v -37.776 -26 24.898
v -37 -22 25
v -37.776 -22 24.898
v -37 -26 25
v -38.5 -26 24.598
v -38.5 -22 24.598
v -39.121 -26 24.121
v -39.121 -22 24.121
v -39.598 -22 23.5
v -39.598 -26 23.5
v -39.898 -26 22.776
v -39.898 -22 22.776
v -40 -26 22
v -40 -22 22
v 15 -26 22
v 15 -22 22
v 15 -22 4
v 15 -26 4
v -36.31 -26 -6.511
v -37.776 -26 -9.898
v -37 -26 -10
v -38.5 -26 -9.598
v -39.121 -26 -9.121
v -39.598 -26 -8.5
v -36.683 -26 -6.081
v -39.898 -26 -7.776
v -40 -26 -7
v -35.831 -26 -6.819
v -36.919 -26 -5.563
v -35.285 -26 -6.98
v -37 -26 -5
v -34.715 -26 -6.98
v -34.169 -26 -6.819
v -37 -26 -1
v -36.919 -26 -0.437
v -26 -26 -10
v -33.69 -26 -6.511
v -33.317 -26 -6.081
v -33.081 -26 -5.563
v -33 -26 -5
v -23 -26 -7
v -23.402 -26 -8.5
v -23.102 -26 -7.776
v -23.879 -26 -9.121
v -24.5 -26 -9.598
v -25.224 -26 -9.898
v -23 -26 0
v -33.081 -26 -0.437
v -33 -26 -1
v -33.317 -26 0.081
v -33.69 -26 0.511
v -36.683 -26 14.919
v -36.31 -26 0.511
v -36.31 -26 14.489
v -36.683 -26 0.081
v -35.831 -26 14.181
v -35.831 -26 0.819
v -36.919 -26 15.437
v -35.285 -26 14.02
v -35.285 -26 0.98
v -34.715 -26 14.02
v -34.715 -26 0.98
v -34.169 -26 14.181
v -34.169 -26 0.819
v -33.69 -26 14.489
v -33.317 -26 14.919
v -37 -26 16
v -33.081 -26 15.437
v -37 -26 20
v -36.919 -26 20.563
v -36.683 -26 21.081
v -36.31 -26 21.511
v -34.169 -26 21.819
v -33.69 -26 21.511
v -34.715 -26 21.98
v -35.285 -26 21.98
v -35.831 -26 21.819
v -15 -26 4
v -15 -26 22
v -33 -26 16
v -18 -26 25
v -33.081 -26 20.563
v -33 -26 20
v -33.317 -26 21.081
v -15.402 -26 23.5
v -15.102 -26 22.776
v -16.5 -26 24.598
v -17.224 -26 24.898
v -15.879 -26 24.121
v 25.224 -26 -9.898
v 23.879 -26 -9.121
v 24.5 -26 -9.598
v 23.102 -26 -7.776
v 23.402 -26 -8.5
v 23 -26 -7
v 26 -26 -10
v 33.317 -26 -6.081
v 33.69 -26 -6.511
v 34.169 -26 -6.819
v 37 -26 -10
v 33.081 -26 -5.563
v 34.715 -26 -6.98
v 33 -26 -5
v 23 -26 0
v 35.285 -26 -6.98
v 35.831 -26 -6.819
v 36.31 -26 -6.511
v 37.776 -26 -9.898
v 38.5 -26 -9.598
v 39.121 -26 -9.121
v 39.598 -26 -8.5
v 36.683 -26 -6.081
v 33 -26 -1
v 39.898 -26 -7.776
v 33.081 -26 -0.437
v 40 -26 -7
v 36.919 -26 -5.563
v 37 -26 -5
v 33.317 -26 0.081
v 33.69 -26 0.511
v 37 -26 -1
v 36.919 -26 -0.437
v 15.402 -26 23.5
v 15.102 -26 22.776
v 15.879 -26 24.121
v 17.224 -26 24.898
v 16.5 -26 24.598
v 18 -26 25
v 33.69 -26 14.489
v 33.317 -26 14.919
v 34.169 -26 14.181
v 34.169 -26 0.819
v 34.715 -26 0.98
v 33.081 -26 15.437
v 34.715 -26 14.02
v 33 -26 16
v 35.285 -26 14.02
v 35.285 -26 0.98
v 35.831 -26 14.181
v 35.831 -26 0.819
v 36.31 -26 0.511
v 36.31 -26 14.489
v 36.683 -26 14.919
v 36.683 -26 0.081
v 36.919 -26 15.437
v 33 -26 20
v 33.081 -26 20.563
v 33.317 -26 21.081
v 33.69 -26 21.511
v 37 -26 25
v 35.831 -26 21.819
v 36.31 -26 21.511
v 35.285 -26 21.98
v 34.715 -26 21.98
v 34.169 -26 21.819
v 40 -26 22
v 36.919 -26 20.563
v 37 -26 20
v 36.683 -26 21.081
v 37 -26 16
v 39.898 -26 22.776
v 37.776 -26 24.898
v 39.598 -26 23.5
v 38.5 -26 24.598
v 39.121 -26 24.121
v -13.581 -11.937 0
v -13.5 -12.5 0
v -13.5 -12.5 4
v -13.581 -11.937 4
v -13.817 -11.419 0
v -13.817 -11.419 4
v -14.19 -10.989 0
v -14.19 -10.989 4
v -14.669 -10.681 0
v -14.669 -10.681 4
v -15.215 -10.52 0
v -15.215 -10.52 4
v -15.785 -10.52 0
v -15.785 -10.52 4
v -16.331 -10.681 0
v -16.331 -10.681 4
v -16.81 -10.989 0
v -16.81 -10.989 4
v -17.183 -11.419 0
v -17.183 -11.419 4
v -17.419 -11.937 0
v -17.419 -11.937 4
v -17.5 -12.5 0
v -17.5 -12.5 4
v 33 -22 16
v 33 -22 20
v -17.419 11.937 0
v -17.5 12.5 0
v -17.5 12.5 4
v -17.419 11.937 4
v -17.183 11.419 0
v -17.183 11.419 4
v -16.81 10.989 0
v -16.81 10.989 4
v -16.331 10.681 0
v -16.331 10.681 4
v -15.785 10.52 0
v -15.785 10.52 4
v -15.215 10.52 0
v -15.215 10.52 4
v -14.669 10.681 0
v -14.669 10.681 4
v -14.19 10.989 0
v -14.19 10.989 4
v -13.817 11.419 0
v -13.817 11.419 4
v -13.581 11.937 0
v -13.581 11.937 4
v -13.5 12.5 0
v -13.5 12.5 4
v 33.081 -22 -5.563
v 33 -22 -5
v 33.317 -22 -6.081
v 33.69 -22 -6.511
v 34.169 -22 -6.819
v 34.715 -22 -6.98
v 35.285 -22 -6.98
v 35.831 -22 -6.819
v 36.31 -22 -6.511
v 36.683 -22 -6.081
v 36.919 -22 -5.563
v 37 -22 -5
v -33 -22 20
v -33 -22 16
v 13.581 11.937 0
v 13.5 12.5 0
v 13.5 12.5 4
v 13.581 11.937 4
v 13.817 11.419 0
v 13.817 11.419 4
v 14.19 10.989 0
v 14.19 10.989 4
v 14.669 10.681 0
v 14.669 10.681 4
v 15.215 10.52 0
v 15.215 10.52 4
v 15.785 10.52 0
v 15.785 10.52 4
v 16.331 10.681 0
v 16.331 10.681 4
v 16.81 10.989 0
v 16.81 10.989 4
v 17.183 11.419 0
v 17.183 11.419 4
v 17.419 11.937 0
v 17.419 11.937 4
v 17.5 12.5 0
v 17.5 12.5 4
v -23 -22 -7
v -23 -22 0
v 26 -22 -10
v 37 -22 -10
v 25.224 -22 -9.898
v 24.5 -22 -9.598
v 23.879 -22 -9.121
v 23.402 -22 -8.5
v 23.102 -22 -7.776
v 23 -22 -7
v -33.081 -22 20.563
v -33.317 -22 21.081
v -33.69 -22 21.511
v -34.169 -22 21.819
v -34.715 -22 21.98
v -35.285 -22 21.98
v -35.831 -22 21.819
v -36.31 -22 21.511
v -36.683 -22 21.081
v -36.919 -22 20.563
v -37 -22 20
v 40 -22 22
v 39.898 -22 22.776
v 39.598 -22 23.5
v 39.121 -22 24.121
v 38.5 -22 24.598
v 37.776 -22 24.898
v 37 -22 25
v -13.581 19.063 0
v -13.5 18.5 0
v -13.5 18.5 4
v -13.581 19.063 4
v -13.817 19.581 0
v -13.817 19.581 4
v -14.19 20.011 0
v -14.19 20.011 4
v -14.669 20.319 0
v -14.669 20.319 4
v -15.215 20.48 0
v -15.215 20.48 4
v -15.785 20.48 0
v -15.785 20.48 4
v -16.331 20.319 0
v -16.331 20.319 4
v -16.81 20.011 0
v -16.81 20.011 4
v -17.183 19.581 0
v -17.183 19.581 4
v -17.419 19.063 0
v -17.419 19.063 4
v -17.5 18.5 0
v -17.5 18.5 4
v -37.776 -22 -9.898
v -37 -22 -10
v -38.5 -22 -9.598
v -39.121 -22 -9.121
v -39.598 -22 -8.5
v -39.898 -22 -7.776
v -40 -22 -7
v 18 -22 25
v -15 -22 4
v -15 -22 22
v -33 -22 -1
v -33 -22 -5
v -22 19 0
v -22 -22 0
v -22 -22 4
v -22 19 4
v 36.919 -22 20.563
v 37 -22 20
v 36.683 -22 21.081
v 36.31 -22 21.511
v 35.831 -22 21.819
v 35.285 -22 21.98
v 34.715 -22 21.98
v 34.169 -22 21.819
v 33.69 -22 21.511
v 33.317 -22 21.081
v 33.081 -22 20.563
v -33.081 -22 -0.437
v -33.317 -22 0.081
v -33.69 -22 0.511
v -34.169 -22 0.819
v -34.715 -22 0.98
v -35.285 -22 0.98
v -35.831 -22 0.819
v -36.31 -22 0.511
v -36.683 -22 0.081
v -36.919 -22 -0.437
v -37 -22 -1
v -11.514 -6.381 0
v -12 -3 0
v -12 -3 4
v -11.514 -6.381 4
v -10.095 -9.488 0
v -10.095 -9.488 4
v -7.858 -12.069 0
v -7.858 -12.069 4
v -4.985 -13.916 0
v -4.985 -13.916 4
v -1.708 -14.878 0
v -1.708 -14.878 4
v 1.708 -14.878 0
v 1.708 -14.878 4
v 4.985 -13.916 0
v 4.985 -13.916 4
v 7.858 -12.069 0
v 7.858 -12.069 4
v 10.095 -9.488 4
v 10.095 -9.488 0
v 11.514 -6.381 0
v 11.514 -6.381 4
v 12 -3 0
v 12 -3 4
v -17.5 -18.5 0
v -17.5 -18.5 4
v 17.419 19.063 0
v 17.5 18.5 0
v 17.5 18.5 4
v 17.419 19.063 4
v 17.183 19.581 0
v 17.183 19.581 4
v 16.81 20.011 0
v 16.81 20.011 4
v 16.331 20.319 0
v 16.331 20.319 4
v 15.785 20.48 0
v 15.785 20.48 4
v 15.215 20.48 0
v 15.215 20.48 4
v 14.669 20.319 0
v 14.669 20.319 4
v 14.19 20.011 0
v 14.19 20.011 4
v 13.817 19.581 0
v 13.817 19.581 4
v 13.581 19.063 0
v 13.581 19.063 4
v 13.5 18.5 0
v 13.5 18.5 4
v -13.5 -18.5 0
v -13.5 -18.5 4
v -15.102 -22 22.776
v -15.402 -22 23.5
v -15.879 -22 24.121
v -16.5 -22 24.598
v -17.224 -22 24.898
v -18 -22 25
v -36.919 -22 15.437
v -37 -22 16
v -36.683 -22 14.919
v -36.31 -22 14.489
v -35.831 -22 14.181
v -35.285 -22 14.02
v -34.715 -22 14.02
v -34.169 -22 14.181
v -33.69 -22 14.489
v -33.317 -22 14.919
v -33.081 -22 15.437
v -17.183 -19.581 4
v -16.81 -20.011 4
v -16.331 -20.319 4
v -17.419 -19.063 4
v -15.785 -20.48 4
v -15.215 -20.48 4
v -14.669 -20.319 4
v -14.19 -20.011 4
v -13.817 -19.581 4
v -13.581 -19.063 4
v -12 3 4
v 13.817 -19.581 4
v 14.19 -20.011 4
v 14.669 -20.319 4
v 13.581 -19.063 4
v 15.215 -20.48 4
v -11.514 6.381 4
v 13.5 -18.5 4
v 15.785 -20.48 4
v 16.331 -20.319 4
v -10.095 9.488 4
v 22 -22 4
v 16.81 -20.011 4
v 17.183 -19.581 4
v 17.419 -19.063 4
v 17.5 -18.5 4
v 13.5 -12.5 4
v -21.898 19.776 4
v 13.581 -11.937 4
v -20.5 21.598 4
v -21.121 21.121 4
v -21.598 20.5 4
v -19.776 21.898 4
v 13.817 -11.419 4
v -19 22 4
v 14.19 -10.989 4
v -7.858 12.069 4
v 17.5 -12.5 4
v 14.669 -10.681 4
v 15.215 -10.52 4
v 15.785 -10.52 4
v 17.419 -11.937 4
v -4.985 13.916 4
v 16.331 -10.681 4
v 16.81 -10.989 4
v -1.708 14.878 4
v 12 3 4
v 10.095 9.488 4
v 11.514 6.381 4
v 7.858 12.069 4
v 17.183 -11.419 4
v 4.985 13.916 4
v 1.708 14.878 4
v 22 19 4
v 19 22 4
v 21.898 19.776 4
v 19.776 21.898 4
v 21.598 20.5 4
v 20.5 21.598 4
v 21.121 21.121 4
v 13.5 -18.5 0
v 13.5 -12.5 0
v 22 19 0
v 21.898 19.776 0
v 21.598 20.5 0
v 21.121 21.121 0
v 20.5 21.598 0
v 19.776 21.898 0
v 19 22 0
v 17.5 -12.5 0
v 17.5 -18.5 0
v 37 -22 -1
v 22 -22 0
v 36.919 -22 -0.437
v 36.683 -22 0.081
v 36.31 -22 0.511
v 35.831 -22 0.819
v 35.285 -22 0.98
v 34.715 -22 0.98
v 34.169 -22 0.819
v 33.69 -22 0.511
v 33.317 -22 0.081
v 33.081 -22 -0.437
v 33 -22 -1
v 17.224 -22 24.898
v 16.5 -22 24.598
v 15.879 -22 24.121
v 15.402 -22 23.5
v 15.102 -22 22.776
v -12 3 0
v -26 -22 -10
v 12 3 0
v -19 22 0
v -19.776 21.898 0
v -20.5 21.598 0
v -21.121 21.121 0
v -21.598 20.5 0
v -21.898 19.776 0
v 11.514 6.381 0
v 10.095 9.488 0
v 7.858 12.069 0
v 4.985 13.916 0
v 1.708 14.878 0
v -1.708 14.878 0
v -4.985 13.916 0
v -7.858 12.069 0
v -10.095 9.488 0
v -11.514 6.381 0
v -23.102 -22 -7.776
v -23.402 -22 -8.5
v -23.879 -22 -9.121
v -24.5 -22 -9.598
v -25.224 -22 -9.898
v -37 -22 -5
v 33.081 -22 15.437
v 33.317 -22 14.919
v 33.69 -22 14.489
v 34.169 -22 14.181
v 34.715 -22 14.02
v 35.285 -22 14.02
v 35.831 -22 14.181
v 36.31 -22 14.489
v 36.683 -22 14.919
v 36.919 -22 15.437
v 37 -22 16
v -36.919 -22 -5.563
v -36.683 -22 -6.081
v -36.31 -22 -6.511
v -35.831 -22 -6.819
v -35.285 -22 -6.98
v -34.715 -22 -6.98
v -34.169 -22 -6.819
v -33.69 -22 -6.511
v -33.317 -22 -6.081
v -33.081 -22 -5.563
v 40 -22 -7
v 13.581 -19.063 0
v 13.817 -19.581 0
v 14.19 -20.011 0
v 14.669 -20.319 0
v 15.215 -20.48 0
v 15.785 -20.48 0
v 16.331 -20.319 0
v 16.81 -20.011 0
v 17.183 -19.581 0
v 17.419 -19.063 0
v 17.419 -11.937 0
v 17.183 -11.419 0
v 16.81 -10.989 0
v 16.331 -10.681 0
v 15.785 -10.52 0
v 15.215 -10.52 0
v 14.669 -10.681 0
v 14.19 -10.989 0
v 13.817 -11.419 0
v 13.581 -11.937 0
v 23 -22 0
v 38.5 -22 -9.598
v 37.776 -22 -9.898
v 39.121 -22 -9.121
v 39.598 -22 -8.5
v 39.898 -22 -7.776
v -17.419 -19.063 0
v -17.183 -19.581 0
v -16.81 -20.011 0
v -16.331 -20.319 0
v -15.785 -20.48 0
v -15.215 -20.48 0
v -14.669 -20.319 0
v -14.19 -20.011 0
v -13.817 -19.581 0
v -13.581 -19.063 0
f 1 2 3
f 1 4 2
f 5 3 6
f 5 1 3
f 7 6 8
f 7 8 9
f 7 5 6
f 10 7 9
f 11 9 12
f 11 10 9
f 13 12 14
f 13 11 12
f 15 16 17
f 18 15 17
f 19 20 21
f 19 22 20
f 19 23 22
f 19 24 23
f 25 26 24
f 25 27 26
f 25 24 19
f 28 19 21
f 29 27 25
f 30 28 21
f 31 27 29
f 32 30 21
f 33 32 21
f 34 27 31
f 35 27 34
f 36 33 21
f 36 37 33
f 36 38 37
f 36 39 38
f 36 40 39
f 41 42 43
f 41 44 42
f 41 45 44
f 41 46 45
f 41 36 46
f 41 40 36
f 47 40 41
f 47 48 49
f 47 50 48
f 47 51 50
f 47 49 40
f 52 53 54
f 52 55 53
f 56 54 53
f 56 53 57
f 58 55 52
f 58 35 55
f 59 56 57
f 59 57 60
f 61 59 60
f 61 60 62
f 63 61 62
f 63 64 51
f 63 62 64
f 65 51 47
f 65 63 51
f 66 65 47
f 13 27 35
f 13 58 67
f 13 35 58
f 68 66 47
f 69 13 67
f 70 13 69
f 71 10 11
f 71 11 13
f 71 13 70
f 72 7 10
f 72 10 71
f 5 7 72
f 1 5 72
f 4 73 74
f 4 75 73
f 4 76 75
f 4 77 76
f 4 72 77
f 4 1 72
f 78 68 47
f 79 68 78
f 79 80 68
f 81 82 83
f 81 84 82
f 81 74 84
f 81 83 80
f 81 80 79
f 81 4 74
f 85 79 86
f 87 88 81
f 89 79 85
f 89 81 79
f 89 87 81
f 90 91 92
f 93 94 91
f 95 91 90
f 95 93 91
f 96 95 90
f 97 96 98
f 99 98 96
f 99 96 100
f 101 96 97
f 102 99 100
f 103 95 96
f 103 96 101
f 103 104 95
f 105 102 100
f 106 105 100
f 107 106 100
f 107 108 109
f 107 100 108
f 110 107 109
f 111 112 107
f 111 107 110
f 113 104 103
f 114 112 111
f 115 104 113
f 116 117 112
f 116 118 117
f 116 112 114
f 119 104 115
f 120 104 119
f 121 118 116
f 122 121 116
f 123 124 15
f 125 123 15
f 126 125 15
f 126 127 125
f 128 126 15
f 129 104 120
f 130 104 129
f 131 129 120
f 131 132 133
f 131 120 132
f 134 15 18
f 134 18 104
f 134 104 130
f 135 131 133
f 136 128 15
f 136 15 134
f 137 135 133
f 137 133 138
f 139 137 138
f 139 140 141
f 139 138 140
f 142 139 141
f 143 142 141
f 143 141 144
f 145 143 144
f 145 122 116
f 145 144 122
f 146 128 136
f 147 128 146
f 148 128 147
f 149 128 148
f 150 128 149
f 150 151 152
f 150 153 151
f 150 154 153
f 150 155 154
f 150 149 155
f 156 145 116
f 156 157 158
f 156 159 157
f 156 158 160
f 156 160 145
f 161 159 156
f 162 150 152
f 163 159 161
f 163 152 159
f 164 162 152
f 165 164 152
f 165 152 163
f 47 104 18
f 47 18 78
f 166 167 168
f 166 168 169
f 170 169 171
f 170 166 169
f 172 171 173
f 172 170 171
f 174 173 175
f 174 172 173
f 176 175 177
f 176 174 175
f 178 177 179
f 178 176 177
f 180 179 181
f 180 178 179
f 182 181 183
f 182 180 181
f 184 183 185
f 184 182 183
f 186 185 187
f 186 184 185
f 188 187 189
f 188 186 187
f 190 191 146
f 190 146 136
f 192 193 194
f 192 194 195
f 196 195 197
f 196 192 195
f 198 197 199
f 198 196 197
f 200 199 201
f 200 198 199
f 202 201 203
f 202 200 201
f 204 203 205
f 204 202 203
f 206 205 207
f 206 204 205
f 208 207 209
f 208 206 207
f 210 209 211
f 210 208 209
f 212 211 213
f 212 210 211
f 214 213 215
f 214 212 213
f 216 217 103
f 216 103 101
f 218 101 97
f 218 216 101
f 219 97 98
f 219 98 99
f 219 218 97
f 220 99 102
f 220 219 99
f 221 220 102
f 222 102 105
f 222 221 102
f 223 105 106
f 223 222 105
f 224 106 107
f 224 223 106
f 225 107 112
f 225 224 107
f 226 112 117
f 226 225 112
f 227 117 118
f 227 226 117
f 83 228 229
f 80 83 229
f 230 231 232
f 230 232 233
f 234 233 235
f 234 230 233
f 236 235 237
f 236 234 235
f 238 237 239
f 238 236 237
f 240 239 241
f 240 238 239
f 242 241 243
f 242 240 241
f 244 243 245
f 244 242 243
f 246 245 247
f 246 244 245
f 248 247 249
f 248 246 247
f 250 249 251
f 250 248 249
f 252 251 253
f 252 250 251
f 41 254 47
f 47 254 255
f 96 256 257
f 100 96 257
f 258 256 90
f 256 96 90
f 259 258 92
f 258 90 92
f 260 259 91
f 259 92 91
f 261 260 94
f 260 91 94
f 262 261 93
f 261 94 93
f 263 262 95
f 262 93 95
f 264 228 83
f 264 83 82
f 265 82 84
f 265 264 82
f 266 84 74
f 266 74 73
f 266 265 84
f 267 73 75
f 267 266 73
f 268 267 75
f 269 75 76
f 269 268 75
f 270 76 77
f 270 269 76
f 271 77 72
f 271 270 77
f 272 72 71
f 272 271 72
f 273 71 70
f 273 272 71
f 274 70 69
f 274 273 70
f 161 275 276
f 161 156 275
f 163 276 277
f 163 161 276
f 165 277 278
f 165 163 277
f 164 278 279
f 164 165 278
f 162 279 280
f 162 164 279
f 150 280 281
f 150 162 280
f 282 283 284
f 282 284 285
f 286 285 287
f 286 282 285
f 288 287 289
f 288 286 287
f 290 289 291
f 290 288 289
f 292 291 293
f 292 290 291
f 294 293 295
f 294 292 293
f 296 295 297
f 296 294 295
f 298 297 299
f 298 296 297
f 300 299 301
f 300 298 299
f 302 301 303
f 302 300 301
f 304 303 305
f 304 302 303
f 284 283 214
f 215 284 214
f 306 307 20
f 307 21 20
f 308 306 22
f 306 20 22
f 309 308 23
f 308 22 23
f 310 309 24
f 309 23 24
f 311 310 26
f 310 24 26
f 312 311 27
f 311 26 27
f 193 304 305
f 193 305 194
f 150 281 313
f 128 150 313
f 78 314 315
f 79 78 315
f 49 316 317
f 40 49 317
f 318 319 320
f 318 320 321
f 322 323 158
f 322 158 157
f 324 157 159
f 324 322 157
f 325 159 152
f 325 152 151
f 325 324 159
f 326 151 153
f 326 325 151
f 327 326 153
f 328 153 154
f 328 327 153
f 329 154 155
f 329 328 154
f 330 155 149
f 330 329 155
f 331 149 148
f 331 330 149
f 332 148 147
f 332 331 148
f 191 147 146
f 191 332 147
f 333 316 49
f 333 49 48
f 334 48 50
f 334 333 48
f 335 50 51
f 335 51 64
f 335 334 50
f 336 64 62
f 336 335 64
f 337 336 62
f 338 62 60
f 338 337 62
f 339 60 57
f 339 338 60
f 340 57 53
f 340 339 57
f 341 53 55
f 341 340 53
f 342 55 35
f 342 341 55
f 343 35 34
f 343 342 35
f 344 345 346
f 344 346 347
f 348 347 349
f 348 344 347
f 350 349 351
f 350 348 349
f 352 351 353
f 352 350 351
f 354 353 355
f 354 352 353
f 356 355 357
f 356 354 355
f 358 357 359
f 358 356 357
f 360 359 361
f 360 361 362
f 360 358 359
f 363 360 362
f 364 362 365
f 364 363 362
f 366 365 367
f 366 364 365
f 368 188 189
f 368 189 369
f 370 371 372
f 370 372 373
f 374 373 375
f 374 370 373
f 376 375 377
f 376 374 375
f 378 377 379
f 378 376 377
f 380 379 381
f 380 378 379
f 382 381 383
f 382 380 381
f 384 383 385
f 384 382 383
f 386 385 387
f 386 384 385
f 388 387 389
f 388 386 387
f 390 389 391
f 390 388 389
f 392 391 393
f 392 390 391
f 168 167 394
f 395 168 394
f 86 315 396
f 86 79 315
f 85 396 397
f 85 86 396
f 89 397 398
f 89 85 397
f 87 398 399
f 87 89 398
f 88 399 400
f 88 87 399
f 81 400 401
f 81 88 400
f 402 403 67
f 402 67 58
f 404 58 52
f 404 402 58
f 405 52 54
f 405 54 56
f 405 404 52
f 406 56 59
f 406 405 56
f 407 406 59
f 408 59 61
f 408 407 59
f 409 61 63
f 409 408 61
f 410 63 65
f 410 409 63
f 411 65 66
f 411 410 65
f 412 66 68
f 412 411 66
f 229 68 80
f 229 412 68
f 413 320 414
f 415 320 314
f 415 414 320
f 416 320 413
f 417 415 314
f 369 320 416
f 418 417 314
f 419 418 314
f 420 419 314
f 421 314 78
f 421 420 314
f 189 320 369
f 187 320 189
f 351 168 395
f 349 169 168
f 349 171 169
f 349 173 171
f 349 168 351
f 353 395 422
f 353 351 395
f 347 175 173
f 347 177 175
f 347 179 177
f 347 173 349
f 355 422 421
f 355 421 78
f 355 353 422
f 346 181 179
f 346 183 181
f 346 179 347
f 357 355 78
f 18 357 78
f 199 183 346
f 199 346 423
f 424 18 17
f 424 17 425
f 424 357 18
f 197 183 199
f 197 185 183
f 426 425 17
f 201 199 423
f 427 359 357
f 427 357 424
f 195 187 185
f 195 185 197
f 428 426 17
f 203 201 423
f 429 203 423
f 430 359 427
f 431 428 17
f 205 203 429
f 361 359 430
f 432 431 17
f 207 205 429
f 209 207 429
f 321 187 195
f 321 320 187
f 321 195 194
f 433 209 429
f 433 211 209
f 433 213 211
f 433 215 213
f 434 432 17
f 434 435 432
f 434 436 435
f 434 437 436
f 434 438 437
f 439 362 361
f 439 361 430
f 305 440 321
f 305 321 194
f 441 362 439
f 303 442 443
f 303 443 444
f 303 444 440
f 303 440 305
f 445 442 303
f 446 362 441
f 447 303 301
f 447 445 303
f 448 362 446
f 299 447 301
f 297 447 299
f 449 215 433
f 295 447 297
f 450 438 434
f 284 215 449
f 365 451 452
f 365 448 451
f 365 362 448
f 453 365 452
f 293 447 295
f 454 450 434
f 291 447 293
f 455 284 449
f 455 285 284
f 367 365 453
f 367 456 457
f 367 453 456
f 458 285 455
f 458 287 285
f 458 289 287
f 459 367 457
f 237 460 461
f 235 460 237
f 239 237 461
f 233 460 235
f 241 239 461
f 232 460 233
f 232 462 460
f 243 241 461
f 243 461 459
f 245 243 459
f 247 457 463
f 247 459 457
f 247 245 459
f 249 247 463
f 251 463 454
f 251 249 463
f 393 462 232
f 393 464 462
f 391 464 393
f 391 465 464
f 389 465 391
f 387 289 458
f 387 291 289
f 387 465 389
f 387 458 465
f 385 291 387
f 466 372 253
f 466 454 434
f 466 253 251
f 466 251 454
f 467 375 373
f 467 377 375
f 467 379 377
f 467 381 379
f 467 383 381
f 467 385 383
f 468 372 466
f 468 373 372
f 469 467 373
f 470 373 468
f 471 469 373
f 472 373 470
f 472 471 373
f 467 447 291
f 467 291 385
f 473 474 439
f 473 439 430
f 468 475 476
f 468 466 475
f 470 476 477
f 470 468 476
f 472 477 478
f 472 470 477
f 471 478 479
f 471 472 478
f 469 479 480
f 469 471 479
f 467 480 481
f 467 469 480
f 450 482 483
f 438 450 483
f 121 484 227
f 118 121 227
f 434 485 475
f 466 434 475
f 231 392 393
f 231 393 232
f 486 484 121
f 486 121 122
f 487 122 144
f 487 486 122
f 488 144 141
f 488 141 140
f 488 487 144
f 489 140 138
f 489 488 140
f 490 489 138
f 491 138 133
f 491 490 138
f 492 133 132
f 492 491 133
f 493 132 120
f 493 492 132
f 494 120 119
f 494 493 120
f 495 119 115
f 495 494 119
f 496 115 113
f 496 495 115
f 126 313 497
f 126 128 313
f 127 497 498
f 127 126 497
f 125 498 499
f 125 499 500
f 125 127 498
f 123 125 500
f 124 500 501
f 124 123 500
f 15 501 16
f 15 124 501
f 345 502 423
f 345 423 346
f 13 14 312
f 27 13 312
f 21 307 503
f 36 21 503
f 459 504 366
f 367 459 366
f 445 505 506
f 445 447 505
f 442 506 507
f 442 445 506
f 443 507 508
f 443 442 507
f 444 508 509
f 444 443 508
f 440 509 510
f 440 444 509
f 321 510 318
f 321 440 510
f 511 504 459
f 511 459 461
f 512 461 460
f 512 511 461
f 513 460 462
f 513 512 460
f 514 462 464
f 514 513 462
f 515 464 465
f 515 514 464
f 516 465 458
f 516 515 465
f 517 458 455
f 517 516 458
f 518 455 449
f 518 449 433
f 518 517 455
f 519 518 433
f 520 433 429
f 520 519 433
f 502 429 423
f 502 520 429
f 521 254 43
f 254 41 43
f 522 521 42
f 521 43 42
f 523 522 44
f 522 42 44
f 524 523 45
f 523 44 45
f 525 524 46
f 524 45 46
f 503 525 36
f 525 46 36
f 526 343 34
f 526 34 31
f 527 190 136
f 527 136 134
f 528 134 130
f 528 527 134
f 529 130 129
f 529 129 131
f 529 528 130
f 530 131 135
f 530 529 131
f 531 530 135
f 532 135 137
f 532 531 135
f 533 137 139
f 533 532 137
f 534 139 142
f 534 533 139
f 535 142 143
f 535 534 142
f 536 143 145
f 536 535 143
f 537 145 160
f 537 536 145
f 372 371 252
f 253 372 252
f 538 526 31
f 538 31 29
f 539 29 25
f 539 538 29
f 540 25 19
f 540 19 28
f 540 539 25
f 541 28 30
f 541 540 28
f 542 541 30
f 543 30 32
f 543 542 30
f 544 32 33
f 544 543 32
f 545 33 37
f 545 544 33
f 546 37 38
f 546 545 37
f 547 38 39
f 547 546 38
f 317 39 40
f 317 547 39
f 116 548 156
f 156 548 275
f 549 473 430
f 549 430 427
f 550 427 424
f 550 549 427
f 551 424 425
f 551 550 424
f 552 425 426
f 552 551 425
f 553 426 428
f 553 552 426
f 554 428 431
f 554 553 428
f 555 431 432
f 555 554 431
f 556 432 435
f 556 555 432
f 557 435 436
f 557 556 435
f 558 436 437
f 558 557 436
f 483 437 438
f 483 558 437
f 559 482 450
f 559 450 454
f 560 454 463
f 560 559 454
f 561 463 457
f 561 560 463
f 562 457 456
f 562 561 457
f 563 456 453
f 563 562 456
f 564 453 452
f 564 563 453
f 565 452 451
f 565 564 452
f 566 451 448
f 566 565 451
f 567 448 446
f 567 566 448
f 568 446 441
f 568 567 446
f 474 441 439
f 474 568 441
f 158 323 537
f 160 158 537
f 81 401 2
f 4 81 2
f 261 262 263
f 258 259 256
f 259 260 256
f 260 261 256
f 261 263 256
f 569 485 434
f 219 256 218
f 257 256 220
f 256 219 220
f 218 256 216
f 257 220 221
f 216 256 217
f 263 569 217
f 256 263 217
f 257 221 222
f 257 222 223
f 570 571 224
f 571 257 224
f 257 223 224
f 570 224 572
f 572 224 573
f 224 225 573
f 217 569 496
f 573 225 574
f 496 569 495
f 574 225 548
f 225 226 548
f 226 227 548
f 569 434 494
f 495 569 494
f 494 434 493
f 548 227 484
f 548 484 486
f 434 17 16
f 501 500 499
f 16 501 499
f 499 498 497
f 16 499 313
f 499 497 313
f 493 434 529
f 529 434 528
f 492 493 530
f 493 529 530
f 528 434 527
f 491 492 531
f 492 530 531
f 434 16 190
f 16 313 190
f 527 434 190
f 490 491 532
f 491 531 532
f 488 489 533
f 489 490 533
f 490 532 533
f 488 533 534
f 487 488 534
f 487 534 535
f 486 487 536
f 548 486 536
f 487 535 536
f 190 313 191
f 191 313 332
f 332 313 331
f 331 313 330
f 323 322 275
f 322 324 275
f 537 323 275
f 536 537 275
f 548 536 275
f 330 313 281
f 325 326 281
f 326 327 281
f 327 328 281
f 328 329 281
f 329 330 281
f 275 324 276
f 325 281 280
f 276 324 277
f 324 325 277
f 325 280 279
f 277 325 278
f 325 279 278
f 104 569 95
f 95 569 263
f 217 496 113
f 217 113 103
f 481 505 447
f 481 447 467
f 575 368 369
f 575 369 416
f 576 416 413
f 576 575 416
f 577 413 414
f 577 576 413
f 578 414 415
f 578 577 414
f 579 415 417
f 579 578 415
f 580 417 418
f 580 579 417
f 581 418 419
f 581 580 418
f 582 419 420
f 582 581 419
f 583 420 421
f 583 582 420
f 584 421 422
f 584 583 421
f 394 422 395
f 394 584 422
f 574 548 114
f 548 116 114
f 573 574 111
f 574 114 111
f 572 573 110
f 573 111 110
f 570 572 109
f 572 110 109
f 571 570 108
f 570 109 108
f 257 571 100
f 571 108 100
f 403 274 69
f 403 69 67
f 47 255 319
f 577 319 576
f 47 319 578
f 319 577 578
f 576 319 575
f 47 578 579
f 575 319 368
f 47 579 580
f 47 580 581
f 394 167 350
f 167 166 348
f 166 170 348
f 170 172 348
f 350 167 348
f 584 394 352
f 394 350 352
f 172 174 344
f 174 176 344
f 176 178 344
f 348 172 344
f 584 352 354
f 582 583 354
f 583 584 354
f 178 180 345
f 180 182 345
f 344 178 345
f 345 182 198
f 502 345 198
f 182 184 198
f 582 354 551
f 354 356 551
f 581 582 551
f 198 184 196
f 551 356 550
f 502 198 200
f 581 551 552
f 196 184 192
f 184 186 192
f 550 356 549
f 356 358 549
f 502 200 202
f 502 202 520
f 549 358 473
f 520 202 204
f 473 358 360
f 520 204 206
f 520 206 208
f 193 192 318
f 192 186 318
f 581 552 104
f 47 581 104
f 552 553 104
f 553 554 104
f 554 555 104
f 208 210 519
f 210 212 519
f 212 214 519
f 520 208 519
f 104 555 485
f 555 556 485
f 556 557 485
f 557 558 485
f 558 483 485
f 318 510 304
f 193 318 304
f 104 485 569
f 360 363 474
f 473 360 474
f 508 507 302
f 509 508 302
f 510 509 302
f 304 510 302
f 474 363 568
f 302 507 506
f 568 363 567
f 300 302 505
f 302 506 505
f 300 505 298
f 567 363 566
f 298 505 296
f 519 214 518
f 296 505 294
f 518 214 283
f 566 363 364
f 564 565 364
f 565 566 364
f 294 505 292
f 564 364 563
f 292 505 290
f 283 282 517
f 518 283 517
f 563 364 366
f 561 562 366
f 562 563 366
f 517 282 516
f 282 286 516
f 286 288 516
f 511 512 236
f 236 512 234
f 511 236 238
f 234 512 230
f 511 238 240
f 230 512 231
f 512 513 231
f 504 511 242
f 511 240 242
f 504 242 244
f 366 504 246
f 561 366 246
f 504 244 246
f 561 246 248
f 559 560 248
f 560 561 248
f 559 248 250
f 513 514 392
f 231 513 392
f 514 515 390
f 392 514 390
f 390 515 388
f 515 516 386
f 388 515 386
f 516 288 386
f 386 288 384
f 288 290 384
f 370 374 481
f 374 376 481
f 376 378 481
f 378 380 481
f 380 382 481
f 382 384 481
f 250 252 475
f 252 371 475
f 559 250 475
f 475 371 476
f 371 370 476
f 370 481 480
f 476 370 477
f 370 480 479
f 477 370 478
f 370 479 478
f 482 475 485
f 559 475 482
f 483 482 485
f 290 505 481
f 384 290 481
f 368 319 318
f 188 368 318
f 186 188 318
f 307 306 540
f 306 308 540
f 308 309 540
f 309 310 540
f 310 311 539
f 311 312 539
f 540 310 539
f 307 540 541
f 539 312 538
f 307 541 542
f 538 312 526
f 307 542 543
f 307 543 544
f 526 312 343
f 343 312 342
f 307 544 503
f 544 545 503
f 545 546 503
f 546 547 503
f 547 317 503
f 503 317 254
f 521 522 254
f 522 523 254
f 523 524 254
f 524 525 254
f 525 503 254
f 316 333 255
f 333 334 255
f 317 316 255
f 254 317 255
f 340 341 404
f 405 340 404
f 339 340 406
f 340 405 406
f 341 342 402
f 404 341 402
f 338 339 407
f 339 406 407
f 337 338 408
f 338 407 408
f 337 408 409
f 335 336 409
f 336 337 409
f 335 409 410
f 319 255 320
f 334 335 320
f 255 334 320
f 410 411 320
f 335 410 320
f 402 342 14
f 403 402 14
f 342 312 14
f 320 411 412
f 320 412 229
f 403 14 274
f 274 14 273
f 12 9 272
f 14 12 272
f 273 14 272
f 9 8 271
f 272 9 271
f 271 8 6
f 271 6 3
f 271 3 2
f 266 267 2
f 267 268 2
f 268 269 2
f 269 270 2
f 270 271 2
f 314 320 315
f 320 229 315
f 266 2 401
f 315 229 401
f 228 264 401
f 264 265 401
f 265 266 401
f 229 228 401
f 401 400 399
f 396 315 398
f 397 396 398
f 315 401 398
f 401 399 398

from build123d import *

# Parameters (mm, degrees)
PAD001_DEPTH = 4
SKETCH_W     = 44
SKETCH_H     = 44
PAD_DEPTH    = 4
FILLET_R     = 3


with BuildPart() as body001:
    # Sketch001 → Pad001 (new body)
    with BuildSketch(Plane.XZ):
        Polygon((40, -10), (40, 25), (15, 25), (15, 4), (-15, 4), (-15, 25), (-40, 25), (-40, -10), (-23, -10), (-23, 0), (23, 0), (23, -10), align=None)
        with BuildLine():
            ThreePointArc((-33, 20), (-35, 22), (-37, 20))
            Line((-37, 20), (-37, 16))
            ThreePointArc((-37, 16), (-35, 14), (-33, 16))
            Line((-33, 20), (-33, 16))
        make_face(mode=Mode.SUBTRACT)
        with BuildLine():
            ThreePointArc((-33, -1), (-35, 1), (-37, -1))
            Line((-37, -1), (-37, -5))
            ThreePointArc((-37, -5), (-35, -7), (-33, -5))
            Line((-33, -1), (-33, -5))
        make_face(mode=Mode.SUBTRACT)
        with BuildLine():
            ThreePointArc((37, 20), (35, 22), (33, 20))
            Line((33, 20), (33, 16))
            ThreePointArc((33, 16), (35, 14), (37, 16))
            Line((37, 20), (37, 16))
        make_face(mode=Mode.SUBTRACT)
        with BuildLine():
            ThreePointArc((37, -1), (35, 1), (33, -1))
            Line((33, -1), (33, -5))
            ThreePointArc((33, -5), (35, -7), (37, -5))
            Line((37, -1), (37, -5))
        make_face(mode=Mode.SUBTRACT)
    extrude(amount=PAD001_DEPTH)


with BuildPart() as body001_1:
    # Body001 placement: moved
    add(body001.part.moved(Location((0, -22, 0))))


with BuildPart() as fillet_body:
    # Sketch → Pad (new body)
    with BuildSketch(Plane.XY):
        Rectangle(SKETCH_W, SKETCH_H)
        with BuildLine():
            ThreePointArc((-13.5, 18.5), (-15.5, 20.5), (-17.5, 18.5))
            Line((-17.5, 18.5), (-17.5, 12.5))
            ThreePointArc((-17.5, 12.5), (-15.5, 10.5), (-13.5, 12.5))
            Line((-13.5, 18.5), (-13.5, 12.5))
        make_face(mode=Mode.SUBTRACT)
        with BuildLine():
            ThreePointArc((-13.5, -12.5), (-15.5, -10.5), (-17.5, -12.5))
            Line((-17.5, -12.5), (-17.5, -18.5))
            ThreePointArc((-17.5, -18.5), (-15.5, -20.5), (-13.5, -18.5))
            Line((-13.5, -12.5), (-13.5, -18.5))
        make_face(mode=Mode.SUBTRACT)
        with BuildLine():
            ThreePointArc((17.5, 18.5), (15.5, 20.5), (13.5, 18.5))
            Line((13.5, 18.5), (13.5, 12.5))
            ThreePointArc((13.5, 12.5), (15.5, 10.5), (17.5, 12.5))
            Line((17.5, 18.5), (17.5, 12.5))
        make_face(mode=Mode.SUBTRACT)
        with BuildLine():
            ThreePointArc((17.5, -12.5), (15.5, -10.5), (13.5, -12.5))
            Line((13.5, -12.5), (13.5, -18.5))
            ThreePointArc((13.5, -18.5), (15.5, -20.5), (17.5, -18.5))
            Line((17.5, -12.5), (17.5, -18.5))
        make_face(mode=Mode.SUBTRACT)
        with BuildLine():
            ThreePointArc((12, 3), (0, 15), (-12, 3))
            Line((-12, 3), (-12, -3))
            ThreePointArc((-12, -3), (0, -15), (12, -3))
            Line((12, 3), (12, -3))
        make_face(mode=Mode.SUBTRACT)
    extrude(amount=PAD_DEPTH)

    # Fusion001: union Body001
    add(body001_1.part)

    # Fillet
    fillet_edges = [fillet_body.edges().sort_by_distance(p)[0] for p in [
        (-22, 22, 2),
        (22, 22, 2),
        (-23, -24, -10),
        (-40, -24, -10),
        (-40, -24, 25),
        (-15, -24, 25),
        (23, -24, -10),
        (40, -24, -10),
        (15, -24, 25),
        (40, -24, 25),
    ]]
    fillet(fillet_edges, radius=FILLET_R)


solid = fillet_body.part
